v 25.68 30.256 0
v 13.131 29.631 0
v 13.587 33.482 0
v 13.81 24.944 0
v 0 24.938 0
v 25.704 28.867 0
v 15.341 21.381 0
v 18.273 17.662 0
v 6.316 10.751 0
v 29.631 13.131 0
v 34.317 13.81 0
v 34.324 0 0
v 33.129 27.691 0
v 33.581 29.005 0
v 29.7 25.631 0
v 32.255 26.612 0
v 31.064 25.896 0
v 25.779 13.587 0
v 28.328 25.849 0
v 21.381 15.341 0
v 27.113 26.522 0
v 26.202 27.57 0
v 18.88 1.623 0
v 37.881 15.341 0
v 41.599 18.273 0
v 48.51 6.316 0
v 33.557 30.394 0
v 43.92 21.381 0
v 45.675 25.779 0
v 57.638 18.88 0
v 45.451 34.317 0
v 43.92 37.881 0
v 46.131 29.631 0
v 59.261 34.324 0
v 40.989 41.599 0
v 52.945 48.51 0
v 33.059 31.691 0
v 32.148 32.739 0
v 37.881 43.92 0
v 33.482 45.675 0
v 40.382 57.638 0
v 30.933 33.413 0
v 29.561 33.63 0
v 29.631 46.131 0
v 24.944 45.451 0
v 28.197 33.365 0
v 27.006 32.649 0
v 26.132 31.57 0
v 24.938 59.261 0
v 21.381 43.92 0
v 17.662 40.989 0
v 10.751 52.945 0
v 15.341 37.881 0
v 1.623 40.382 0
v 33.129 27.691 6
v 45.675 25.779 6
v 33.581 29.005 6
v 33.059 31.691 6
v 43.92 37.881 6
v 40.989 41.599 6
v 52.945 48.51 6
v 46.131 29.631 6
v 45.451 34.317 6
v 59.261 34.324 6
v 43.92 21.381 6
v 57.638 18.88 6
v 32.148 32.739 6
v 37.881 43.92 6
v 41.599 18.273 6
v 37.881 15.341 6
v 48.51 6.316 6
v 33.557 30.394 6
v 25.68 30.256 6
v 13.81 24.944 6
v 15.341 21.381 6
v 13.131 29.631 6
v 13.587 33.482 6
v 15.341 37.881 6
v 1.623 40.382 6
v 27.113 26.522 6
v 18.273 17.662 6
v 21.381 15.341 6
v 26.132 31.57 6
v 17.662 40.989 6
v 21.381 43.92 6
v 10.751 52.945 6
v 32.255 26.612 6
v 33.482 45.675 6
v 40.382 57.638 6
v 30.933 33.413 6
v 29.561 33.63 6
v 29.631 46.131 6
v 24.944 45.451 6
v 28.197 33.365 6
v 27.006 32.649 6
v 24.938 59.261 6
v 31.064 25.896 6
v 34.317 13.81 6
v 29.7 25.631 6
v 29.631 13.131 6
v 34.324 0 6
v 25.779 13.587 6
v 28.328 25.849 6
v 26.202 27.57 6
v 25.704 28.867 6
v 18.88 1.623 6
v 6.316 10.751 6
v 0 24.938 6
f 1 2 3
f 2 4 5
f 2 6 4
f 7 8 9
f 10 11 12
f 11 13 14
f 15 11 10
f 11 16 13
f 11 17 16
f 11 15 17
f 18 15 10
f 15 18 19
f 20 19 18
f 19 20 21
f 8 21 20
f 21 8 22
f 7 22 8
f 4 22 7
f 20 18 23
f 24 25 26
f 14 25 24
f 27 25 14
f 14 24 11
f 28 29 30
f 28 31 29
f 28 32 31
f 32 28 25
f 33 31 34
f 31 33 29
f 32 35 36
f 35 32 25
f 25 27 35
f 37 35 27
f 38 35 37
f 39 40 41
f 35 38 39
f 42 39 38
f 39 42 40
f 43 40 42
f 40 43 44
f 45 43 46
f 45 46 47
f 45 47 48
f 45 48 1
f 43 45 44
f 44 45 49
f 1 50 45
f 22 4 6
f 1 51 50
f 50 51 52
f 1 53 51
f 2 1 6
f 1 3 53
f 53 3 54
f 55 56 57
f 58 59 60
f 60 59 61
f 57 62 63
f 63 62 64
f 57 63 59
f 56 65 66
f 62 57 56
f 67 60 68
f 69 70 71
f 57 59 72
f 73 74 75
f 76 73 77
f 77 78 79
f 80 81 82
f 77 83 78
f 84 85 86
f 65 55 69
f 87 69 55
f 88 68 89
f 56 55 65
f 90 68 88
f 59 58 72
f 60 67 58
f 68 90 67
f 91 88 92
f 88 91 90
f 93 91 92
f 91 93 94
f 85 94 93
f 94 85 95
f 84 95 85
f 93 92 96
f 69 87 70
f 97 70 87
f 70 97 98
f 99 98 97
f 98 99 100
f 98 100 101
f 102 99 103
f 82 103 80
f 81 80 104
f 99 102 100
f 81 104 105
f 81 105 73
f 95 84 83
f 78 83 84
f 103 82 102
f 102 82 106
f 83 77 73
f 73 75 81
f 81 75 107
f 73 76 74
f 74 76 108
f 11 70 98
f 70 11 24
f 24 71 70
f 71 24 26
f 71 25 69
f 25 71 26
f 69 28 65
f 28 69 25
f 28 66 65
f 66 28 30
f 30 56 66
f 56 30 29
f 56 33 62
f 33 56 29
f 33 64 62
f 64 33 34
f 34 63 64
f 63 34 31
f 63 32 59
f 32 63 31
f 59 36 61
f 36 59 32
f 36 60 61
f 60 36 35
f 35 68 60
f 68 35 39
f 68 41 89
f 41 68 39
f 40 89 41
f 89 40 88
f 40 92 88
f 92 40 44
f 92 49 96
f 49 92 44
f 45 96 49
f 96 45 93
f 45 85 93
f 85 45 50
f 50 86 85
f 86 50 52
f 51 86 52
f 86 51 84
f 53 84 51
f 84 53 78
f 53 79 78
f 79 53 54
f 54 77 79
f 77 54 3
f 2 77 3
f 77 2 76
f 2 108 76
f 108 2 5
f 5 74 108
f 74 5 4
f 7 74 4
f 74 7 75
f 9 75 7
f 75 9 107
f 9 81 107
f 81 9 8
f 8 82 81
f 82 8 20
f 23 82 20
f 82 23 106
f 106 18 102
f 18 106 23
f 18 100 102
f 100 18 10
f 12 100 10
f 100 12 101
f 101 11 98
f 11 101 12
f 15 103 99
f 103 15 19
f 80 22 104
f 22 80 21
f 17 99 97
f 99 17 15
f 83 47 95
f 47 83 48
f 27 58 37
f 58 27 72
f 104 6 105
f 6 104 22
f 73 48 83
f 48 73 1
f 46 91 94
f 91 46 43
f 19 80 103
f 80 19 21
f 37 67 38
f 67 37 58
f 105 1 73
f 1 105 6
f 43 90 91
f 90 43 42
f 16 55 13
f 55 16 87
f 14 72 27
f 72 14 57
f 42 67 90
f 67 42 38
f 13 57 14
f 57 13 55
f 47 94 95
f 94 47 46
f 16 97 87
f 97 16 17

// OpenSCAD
$fn = 32;

// ----------------------------------------------------------------------
// Star wheel: 12-point ratchet, R30
// ----------------------------------------------------------------------

// --- parameters (mm) ---
n_points = 12;            // number of points / teeth
r_out = 30;               // tip radius
r_in = 16.5;              // root radius
bore_r = 4;               // centre bore radius
plate_t = 6;              // plate thickness, Z (extrusion height)
bore_d = 8;               // centre bore diameter

profile = [[46.131, 29.631], [59.261, 34.324], [45.451, 34.317], [43.92, 37.881], [52.945, 48.51], [40.989, 41.599], [37.881, 43.92], [40.382, 57.638], [33.482, 45.675], [29.631, 46.131], [24.938, 59.261], [24.944, 45.451], [21.381, 43.92], [10.751, 52.945], [17.662, 40.989], [15.341, 37.881], [1.623, 40.382], [13.587, 33.482], [13.131, 29.631], [0, 24.938], [13.81, 24.944], [15.341, 21.381], [6.316, 10.751], [18.273, 17.662], [21.381, 15.341], [18.88, 1.623], [25.779, 13.587], [29.631, 13.131], [34.324, 0], [34.317, 13.81], [37.881, 15.341], [48.51, 6.316], [41.599, 18.273], [43.92, 21.381], [57.638, 18.88], [45.675, 25.779]];  // primary outline, 36 points, counter clockwise
void_1 = [[33.557, 30.394], [33.059, 31.691], [32.148, 32.739], [30.933, 33.413], [29.561, 33.63], [28.197, 33.365], [27.006, 32.649], [26.132, 31.57], [25.68, 30.256], [25.704, 28.867], [26.202, 27.57], [27.113, 26.522], [28.328, 25.849], [29.7, 25.631], [31.064, 25.896], [32.255, 26.612], [33.129, 27.691], [33.581, 29.005]];  // centre bore, 18 points

// --- the one profile operation ---
difference() {
  linear_extrude(height = plate_t) polygon(points = profile);
  translate([0, 0, -1])
    linear_extrude(height = plate_t + 2) polygon(points = void_1);
}
